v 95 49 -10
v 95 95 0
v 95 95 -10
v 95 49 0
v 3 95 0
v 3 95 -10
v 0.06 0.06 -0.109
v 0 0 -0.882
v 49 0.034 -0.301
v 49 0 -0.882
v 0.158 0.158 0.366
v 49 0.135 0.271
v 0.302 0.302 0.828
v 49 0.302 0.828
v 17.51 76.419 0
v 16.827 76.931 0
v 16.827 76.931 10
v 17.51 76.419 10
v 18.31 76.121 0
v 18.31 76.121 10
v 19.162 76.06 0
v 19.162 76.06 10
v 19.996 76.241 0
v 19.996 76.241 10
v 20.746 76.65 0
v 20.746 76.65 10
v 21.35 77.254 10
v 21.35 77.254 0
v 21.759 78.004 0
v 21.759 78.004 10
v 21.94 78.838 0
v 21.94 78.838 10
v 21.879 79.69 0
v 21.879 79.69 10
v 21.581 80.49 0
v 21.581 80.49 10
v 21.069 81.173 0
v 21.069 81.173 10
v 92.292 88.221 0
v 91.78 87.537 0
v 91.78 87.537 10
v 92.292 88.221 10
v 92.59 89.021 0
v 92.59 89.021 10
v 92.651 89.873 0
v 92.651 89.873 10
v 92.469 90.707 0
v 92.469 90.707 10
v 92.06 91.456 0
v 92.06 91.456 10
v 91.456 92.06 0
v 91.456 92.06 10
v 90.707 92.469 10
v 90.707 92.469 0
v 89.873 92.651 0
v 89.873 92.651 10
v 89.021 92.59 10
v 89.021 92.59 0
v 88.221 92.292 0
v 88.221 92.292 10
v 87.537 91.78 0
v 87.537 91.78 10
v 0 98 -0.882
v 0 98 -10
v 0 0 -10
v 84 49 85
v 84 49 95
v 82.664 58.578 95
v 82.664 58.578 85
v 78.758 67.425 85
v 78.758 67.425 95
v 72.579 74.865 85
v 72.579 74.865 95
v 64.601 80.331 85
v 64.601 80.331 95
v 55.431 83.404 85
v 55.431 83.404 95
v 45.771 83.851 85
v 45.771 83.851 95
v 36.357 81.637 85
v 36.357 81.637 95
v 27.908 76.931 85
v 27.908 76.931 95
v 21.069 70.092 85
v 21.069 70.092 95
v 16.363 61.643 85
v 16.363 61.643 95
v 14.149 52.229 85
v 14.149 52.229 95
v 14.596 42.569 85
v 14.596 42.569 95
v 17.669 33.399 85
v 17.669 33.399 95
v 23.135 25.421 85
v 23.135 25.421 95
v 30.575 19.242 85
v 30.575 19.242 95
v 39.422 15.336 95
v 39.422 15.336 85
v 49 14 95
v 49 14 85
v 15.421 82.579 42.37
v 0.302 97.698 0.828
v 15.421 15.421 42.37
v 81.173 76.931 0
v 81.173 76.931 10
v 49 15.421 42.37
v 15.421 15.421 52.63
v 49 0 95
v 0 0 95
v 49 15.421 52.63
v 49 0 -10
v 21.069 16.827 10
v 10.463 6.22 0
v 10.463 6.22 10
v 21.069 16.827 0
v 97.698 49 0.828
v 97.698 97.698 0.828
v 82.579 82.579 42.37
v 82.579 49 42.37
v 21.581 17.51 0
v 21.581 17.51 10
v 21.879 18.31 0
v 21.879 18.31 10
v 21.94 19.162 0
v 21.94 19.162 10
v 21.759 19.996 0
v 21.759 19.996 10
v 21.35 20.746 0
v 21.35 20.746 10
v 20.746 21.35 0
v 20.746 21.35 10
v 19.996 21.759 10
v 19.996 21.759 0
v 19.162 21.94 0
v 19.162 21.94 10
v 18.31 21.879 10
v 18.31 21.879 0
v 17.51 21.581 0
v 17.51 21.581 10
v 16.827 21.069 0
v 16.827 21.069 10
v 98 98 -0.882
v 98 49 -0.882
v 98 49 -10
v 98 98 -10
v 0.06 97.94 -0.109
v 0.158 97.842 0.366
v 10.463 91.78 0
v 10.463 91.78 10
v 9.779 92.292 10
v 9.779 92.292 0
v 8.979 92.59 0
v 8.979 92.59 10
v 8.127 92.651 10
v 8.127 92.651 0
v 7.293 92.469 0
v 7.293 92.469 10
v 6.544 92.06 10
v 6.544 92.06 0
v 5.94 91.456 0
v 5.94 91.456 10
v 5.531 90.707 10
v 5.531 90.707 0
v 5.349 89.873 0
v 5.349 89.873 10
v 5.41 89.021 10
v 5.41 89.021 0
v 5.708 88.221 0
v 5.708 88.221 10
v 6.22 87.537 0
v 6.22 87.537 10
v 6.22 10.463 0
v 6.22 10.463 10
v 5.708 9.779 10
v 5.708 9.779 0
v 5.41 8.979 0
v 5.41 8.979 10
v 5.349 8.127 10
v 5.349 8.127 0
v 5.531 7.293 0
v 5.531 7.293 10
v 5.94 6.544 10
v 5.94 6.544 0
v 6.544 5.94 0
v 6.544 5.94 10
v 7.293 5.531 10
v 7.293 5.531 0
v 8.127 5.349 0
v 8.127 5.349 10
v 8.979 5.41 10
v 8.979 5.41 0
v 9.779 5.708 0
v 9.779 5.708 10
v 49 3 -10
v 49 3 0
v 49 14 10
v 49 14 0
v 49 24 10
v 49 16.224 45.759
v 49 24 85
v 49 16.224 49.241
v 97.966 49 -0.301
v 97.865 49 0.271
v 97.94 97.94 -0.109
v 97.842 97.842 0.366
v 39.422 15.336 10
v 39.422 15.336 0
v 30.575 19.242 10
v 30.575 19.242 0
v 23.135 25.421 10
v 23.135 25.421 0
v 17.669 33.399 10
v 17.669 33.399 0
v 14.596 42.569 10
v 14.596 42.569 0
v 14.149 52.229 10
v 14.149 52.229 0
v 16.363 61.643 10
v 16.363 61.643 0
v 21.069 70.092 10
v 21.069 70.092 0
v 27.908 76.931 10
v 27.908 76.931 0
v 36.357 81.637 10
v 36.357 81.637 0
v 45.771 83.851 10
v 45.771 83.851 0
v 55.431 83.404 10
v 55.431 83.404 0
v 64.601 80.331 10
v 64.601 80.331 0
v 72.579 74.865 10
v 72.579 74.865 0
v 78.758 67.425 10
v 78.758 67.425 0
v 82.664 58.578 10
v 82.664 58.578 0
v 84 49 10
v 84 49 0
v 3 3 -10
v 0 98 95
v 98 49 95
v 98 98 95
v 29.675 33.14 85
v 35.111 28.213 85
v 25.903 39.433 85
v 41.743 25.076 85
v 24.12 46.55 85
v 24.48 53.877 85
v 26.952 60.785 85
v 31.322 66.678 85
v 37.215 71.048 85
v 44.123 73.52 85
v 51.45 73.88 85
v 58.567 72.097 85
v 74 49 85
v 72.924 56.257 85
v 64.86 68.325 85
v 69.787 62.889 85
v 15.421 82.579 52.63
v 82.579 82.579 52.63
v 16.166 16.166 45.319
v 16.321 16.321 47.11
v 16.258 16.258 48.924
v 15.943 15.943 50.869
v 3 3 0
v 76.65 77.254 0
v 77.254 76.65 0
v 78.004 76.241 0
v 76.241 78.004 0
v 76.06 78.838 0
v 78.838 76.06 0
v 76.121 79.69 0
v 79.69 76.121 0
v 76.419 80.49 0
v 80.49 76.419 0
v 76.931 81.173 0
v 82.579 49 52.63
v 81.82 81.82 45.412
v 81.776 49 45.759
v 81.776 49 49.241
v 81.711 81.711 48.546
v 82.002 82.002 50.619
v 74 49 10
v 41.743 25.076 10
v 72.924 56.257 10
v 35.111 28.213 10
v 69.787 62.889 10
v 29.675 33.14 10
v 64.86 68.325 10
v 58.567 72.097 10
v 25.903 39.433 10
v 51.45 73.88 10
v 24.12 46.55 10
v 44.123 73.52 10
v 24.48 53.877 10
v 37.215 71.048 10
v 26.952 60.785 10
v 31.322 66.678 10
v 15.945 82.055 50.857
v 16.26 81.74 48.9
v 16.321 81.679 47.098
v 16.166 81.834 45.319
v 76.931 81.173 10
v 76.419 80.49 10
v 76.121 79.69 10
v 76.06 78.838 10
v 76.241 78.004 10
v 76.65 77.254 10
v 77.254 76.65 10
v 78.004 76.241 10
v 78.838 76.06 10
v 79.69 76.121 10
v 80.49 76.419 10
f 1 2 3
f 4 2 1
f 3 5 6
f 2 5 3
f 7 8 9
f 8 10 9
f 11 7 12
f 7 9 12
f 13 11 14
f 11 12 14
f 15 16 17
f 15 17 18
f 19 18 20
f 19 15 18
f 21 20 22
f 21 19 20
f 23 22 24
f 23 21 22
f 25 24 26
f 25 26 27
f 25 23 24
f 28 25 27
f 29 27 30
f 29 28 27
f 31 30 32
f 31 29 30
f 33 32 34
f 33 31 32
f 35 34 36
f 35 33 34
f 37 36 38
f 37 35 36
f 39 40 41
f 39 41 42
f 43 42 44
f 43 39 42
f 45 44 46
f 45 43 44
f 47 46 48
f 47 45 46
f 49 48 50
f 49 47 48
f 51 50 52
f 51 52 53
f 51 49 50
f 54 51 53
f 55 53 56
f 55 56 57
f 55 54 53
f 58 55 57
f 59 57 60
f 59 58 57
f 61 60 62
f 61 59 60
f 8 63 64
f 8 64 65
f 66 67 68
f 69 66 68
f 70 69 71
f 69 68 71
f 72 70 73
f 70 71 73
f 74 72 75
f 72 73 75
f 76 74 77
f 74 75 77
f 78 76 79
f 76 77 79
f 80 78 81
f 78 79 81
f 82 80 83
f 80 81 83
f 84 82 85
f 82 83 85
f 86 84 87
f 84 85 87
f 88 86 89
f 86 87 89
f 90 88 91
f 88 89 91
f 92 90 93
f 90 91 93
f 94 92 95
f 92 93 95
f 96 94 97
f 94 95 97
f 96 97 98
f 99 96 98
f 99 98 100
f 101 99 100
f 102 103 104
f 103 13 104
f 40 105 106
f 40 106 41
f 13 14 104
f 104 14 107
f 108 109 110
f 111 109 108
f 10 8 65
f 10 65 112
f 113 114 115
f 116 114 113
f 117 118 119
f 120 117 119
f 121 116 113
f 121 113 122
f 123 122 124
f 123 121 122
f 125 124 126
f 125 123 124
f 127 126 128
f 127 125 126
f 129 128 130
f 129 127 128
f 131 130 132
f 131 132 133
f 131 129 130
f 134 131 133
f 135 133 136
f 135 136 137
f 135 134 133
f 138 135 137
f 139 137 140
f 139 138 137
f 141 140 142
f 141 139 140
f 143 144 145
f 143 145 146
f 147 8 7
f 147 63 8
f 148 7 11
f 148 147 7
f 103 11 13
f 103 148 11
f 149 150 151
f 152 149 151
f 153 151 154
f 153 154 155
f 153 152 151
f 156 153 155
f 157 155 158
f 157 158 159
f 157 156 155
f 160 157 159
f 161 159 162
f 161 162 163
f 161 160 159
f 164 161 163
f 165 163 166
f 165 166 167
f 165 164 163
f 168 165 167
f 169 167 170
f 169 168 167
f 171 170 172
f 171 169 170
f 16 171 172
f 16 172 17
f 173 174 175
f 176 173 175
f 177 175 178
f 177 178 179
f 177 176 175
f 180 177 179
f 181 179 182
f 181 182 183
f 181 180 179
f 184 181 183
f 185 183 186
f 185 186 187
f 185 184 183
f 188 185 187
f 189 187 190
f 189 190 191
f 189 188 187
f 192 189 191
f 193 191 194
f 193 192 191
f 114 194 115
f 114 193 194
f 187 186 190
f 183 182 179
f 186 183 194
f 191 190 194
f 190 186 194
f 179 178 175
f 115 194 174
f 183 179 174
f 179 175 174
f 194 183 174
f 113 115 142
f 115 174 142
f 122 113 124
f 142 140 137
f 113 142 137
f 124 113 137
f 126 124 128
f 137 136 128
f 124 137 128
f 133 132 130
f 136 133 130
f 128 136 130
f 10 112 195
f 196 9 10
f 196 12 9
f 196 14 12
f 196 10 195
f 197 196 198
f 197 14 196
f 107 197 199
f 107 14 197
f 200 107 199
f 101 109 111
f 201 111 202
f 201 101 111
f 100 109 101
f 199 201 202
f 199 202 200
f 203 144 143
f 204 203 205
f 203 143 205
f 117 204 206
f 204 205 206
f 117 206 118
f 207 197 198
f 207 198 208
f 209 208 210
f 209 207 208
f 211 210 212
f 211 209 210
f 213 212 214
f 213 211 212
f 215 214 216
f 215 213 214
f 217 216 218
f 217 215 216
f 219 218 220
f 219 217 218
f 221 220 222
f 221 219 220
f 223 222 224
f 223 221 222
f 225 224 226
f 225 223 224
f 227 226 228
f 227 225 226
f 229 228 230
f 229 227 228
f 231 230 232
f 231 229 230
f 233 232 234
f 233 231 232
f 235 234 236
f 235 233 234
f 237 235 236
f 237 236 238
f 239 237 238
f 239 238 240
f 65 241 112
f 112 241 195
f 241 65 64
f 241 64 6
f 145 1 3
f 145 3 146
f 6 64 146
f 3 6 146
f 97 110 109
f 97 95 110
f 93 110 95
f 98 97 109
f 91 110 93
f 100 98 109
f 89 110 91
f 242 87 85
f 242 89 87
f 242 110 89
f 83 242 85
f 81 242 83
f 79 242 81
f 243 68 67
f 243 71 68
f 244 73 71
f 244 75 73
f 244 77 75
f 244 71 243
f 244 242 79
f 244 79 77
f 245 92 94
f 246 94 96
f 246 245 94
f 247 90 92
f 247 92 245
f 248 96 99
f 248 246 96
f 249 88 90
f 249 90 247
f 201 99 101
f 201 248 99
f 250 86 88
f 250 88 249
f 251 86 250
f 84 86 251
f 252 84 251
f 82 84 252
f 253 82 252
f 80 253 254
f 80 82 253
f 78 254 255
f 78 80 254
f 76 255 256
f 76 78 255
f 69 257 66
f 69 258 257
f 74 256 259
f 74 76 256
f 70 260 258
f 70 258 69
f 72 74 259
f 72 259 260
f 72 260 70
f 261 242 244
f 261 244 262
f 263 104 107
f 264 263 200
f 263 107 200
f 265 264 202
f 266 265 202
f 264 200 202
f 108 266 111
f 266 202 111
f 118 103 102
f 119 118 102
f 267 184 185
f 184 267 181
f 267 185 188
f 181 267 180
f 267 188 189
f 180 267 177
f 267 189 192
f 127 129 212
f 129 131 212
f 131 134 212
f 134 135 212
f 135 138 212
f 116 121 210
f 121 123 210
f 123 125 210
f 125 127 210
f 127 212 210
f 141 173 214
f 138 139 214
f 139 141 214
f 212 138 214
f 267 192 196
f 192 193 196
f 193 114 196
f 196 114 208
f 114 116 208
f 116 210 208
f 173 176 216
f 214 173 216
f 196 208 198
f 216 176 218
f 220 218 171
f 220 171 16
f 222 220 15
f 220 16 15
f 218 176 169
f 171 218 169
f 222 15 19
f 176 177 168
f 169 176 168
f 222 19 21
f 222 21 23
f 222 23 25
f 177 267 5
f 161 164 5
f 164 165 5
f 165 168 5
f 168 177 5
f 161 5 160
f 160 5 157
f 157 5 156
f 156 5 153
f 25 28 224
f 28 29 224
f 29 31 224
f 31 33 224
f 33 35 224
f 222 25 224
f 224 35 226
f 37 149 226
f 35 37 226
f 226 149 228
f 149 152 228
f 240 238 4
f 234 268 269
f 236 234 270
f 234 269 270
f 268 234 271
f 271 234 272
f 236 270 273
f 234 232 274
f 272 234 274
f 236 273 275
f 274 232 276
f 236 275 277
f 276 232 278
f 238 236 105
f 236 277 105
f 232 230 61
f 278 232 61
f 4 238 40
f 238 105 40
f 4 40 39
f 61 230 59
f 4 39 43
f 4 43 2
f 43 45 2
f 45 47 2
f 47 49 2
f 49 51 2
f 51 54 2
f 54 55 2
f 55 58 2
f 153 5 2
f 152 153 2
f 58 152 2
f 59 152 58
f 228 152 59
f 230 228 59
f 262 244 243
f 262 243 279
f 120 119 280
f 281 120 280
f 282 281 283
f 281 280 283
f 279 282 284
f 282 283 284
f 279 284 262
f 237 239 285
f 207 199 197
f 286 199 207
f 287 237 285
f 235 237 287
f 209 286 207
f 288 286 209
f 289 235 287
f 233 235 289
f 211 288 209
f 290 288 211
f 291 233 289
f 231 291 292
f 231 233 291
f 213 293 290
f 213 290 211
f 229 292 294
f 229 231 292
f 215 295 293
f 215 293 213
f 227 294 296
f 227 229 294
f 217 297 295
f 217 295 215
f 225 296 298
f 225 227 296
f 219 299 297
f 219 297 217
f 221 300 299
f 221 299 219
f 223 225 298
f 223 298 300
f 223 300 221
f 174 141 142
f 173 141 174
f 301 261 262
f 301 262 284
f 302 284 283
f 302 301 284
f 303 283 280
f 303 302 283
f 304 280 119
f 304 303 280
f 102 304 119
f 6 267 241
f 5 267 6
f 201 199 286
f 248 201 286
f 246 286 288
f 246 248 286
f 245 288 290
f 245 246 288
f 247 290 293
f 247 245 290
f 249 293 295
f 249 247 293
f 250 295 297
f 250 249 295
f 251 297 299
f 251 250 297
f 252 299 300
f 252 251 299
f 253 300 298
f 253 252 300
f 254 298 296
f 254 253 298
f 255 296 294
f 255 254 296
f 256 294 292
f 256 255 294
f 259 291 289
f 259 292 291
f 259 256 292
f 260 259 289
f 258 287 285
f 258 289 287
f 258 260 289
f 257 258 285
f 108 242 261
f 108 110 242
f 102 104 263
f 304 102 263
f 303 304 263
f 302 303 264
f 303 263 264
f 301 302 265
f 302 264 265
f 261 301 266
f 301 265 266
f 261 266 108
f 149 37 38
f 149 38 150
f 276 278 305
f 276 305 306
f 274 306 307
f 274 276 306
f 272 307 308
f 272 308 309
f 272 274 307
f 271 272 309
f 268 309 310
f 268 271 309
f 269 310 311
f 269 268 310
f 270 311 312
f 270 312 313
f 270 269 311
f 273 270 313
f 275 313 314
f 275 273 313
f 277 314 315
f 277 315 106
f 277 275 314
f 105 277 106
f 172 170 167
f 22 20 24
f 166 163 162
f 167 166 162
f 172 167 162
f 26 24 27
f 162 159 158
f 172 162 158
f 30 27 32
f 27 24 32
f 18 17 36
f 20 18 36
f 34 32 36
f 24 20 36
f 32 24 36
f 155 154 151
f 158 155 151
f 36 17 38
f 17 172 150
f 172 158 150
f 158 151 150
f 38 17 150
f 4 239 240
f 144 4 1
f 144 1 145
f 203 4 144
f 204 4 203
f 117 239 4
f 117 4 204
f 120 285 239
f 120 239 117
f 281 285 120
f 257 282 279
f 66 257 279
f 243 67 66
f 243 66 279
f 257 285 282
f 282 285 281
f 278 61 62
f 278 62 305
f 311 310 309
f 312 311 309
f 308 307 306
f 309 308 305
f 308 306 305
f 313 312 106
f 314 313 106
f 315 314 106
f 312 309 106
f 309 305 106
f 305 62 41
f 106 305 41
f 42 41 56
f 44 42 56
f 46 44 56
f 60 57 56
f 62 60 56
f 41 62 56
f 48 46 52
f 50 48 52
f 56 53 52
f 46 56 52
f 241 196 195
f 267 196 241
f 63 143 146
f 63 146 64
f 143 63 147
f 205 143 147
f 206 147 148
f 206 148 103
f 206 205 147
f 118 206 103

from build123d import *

# Parameters (mm, degrees)
ESQUISSE1_W             = 98
ESQUISSE1_H             = 98
BOSS_EXTRU_1_DEPTH      = 47.5
BOSS_EXTRU_1_TAPER      = 20
ESQUISSE2_R             = 25
ENL_V_MAT_EXTRU_1_DEPTH = 147.50682578
ENL_V_MAT_EXTRU_4_DEPTH = 169.026783579
CONG_1_R                = 15
ESQUISSE4_R             = 35
ENL_V_MAT_EXTRU_5_DEPTH = 10
ENL_V_START             = -10
ESQUISSE5_R             = 35
ENL_V_MAT_EXTRU_6_DEPTH = 10
BOSS_EXTRU_2_DEPTH      = 10
CONG_2_R                = 5
ENL_V_MAT_EXTRU_7_DEPTH = 10


with BuildPart() as part:
    # Esquisse1 → Boss.-Extru.1 (new body)
    with BuildSketch(Plane.XY):
        with Locations((49, 49)):
            Rectangle(ESQUISSE1_W, ESQUISSE1_H)
    boss_extru_1 = extrude(amount=BOSS_EXTRU_1_DEPTH, taper=BOSS_EXTRU_1_TAPER)

    # Esquisse2 → Enlèv. mat.-Extru.1 (cut, through all)
    with BuildSketch(Plane(origin=(0, 0, 0), x_dir=(-1, 0, 0), z_dir=(0, 0, -1))):
        with Locations((-49, 49)):
            Circle(ESQUISSE2_R)
    enl_v_mat_extru_1 = extrude(amount=-ENL_V_MAT_EXTRU_1_DEPTH, mode=Mode.SUBTRACT)

    # Symétrie1: Boss.-Extru.1, Enlèv. mat.-Extru.1 across plane
    add(boss_extru_1.mirror(Plane.XY.offset(47.5)))
    add(enl_v_mat_extru_1.mirror(Plane.XY.offset(47.5)), mode=Mode.SUBTRACT)

    # Esquisse3 → Enlèv. mat.-Extru.4 (cut, through all)
    with BuildSketch(Plane.XY.offset(95)):
        with BuildLine():
            ThreePointArc((74, 49), (66.67766953, 31.32233047), (49, 24))
            Line((49, 24), (49, 0))
            Line((49, 0), (98, 0))
            Line((98, 0), (98, 49))
            Line((98, 49), (74, 49))
        make_face()
    extrude(amount=-ENL_V_MAT_EXTRU_4_DEPTH, mode=Mode.SUBTRACT)

    # Congé1
    cong_1_edges = [part.edges().sort_by_distance(p)[0] for p in [
        (33.144293064, 17.288586128, 47.5),
        (17.288586128, 49, 47.5),
        (80.711413872, 64.855706936, 47.5),
        (49, 80.711413872, 47.5),
    ]]
    fillet(cong_1_edges, radius=CONG_1_R)

    # Esquisse4 → Enlèv. mat.-Extru.5 (cut)
    with BuildSketch(Plane.XY.offset(95)):
        with Locations((49, 49)):
            Circle(ESQUISSE4_R)
    extrude(amount=-ENL_V_MAT_EXTRU_5_DEPTH, mode=Mode.SUBTRACT)

    # Esquisse5 → Enlèv. mat.-Extru.6 (cut)
    with BuildSketch(Plane(origin=(0, 0, 0), x_dir=(-1, 0, 0), z_dir=(0, 0, -1)).offset(ENL_V_START)):
        with Locations((-49, 49)):
            Circle(ESQUISSE5_R)
    extrude(amount=ENL_V_MAT_EXTRU_6_DEPTH, mode=Mode.SUBTRACT)

    # Esquisse6 → Boss.-Extru.2 (add)
    with BuildSketch(Plane(origin=(0, 0, 0), x_dir=(-1, 0, 0), z_dir=(0, 0, -1))):
        Polygon((-98, 49), (-98, 98), (0, 98), (0, 0), (-49, 0), (-49, 3), (-3, 3), (-3, 95), (-95, 95), (-95, 49), align=None)
    extrude(amount=BOSS_EXTRU_2_DEPTH)

    # Congé2
    cong_2_edges = [part.edges().sort_by_distance(p)[0] for p in [
        (98, 73.5, 0),
        (0, 49, 0),
        (24.5, 0, 0),
        (49, 98, 0),
    ]]
    fillet(cong_2_edges, radius=CONG_2_R)

    # Esquisse7 → Enlèv. mat.-Extru.7 (cut)
    with BuildSketch(Plane(origin=(0, 0, 0), x_dir=(-1, 0, 0), z_dir=(0, 0, -1))):
        with BuildLine():
            Line((-87.537319575, 91.779960262), (-76.930717857, 81.173358544))
            ThreePointArc((-76.930717857, 81.173358544), (-76.930717857, 76.930717857), (-81.173358544, 76.930717857))
            Line((-81.173358544, 76.930717857), (-91.779960262, 87.537319575))
            ThreePointArc((-91.779960262, 87.537319575), (-91.779960262, 91.779960262), (-87.537319575, 91.779960262))
        make_face()
        with BuildLine():
            Line((-6.220039738, 87.537319575), (-16.826641456, 76.930717857))
            ThreePointArc((-16.826641456, 76.930717857), (-21.069282143, 76.930717857), (-21.069282143, 81.173358544))
            Line((-21.069282143, 81.173358544), (-10.462680425, 91.779960262))
            ThreePointArc((-10.462680425, 91.779960262), (-6.220039738, 91.779960262), (-6.220039738, 87.537319575))
        make_face()
        with BuildLine():
            Line((-10.462680425, 6.220039738), (-21.069282143, 16.826641456))
            ThreePointArc((-21.069282143, 16.826641456), (-21.069282143, 21.069282143), (-16.826641456, 21.069282143))
            Line((-16.826641456, 21.069282143), (-6.220039738, 10.462680425))
            ThreePointArc((-6.220039738, 10.462680425), (-6.220039738, 6.220039738), (-10.462680425, 6.220039738))
        make_face()
    extrude(amount=-ENL_V_MAT_EXTRU_7_DEPTH, mode=Mode.SUBTRACT)


solid = part.part
